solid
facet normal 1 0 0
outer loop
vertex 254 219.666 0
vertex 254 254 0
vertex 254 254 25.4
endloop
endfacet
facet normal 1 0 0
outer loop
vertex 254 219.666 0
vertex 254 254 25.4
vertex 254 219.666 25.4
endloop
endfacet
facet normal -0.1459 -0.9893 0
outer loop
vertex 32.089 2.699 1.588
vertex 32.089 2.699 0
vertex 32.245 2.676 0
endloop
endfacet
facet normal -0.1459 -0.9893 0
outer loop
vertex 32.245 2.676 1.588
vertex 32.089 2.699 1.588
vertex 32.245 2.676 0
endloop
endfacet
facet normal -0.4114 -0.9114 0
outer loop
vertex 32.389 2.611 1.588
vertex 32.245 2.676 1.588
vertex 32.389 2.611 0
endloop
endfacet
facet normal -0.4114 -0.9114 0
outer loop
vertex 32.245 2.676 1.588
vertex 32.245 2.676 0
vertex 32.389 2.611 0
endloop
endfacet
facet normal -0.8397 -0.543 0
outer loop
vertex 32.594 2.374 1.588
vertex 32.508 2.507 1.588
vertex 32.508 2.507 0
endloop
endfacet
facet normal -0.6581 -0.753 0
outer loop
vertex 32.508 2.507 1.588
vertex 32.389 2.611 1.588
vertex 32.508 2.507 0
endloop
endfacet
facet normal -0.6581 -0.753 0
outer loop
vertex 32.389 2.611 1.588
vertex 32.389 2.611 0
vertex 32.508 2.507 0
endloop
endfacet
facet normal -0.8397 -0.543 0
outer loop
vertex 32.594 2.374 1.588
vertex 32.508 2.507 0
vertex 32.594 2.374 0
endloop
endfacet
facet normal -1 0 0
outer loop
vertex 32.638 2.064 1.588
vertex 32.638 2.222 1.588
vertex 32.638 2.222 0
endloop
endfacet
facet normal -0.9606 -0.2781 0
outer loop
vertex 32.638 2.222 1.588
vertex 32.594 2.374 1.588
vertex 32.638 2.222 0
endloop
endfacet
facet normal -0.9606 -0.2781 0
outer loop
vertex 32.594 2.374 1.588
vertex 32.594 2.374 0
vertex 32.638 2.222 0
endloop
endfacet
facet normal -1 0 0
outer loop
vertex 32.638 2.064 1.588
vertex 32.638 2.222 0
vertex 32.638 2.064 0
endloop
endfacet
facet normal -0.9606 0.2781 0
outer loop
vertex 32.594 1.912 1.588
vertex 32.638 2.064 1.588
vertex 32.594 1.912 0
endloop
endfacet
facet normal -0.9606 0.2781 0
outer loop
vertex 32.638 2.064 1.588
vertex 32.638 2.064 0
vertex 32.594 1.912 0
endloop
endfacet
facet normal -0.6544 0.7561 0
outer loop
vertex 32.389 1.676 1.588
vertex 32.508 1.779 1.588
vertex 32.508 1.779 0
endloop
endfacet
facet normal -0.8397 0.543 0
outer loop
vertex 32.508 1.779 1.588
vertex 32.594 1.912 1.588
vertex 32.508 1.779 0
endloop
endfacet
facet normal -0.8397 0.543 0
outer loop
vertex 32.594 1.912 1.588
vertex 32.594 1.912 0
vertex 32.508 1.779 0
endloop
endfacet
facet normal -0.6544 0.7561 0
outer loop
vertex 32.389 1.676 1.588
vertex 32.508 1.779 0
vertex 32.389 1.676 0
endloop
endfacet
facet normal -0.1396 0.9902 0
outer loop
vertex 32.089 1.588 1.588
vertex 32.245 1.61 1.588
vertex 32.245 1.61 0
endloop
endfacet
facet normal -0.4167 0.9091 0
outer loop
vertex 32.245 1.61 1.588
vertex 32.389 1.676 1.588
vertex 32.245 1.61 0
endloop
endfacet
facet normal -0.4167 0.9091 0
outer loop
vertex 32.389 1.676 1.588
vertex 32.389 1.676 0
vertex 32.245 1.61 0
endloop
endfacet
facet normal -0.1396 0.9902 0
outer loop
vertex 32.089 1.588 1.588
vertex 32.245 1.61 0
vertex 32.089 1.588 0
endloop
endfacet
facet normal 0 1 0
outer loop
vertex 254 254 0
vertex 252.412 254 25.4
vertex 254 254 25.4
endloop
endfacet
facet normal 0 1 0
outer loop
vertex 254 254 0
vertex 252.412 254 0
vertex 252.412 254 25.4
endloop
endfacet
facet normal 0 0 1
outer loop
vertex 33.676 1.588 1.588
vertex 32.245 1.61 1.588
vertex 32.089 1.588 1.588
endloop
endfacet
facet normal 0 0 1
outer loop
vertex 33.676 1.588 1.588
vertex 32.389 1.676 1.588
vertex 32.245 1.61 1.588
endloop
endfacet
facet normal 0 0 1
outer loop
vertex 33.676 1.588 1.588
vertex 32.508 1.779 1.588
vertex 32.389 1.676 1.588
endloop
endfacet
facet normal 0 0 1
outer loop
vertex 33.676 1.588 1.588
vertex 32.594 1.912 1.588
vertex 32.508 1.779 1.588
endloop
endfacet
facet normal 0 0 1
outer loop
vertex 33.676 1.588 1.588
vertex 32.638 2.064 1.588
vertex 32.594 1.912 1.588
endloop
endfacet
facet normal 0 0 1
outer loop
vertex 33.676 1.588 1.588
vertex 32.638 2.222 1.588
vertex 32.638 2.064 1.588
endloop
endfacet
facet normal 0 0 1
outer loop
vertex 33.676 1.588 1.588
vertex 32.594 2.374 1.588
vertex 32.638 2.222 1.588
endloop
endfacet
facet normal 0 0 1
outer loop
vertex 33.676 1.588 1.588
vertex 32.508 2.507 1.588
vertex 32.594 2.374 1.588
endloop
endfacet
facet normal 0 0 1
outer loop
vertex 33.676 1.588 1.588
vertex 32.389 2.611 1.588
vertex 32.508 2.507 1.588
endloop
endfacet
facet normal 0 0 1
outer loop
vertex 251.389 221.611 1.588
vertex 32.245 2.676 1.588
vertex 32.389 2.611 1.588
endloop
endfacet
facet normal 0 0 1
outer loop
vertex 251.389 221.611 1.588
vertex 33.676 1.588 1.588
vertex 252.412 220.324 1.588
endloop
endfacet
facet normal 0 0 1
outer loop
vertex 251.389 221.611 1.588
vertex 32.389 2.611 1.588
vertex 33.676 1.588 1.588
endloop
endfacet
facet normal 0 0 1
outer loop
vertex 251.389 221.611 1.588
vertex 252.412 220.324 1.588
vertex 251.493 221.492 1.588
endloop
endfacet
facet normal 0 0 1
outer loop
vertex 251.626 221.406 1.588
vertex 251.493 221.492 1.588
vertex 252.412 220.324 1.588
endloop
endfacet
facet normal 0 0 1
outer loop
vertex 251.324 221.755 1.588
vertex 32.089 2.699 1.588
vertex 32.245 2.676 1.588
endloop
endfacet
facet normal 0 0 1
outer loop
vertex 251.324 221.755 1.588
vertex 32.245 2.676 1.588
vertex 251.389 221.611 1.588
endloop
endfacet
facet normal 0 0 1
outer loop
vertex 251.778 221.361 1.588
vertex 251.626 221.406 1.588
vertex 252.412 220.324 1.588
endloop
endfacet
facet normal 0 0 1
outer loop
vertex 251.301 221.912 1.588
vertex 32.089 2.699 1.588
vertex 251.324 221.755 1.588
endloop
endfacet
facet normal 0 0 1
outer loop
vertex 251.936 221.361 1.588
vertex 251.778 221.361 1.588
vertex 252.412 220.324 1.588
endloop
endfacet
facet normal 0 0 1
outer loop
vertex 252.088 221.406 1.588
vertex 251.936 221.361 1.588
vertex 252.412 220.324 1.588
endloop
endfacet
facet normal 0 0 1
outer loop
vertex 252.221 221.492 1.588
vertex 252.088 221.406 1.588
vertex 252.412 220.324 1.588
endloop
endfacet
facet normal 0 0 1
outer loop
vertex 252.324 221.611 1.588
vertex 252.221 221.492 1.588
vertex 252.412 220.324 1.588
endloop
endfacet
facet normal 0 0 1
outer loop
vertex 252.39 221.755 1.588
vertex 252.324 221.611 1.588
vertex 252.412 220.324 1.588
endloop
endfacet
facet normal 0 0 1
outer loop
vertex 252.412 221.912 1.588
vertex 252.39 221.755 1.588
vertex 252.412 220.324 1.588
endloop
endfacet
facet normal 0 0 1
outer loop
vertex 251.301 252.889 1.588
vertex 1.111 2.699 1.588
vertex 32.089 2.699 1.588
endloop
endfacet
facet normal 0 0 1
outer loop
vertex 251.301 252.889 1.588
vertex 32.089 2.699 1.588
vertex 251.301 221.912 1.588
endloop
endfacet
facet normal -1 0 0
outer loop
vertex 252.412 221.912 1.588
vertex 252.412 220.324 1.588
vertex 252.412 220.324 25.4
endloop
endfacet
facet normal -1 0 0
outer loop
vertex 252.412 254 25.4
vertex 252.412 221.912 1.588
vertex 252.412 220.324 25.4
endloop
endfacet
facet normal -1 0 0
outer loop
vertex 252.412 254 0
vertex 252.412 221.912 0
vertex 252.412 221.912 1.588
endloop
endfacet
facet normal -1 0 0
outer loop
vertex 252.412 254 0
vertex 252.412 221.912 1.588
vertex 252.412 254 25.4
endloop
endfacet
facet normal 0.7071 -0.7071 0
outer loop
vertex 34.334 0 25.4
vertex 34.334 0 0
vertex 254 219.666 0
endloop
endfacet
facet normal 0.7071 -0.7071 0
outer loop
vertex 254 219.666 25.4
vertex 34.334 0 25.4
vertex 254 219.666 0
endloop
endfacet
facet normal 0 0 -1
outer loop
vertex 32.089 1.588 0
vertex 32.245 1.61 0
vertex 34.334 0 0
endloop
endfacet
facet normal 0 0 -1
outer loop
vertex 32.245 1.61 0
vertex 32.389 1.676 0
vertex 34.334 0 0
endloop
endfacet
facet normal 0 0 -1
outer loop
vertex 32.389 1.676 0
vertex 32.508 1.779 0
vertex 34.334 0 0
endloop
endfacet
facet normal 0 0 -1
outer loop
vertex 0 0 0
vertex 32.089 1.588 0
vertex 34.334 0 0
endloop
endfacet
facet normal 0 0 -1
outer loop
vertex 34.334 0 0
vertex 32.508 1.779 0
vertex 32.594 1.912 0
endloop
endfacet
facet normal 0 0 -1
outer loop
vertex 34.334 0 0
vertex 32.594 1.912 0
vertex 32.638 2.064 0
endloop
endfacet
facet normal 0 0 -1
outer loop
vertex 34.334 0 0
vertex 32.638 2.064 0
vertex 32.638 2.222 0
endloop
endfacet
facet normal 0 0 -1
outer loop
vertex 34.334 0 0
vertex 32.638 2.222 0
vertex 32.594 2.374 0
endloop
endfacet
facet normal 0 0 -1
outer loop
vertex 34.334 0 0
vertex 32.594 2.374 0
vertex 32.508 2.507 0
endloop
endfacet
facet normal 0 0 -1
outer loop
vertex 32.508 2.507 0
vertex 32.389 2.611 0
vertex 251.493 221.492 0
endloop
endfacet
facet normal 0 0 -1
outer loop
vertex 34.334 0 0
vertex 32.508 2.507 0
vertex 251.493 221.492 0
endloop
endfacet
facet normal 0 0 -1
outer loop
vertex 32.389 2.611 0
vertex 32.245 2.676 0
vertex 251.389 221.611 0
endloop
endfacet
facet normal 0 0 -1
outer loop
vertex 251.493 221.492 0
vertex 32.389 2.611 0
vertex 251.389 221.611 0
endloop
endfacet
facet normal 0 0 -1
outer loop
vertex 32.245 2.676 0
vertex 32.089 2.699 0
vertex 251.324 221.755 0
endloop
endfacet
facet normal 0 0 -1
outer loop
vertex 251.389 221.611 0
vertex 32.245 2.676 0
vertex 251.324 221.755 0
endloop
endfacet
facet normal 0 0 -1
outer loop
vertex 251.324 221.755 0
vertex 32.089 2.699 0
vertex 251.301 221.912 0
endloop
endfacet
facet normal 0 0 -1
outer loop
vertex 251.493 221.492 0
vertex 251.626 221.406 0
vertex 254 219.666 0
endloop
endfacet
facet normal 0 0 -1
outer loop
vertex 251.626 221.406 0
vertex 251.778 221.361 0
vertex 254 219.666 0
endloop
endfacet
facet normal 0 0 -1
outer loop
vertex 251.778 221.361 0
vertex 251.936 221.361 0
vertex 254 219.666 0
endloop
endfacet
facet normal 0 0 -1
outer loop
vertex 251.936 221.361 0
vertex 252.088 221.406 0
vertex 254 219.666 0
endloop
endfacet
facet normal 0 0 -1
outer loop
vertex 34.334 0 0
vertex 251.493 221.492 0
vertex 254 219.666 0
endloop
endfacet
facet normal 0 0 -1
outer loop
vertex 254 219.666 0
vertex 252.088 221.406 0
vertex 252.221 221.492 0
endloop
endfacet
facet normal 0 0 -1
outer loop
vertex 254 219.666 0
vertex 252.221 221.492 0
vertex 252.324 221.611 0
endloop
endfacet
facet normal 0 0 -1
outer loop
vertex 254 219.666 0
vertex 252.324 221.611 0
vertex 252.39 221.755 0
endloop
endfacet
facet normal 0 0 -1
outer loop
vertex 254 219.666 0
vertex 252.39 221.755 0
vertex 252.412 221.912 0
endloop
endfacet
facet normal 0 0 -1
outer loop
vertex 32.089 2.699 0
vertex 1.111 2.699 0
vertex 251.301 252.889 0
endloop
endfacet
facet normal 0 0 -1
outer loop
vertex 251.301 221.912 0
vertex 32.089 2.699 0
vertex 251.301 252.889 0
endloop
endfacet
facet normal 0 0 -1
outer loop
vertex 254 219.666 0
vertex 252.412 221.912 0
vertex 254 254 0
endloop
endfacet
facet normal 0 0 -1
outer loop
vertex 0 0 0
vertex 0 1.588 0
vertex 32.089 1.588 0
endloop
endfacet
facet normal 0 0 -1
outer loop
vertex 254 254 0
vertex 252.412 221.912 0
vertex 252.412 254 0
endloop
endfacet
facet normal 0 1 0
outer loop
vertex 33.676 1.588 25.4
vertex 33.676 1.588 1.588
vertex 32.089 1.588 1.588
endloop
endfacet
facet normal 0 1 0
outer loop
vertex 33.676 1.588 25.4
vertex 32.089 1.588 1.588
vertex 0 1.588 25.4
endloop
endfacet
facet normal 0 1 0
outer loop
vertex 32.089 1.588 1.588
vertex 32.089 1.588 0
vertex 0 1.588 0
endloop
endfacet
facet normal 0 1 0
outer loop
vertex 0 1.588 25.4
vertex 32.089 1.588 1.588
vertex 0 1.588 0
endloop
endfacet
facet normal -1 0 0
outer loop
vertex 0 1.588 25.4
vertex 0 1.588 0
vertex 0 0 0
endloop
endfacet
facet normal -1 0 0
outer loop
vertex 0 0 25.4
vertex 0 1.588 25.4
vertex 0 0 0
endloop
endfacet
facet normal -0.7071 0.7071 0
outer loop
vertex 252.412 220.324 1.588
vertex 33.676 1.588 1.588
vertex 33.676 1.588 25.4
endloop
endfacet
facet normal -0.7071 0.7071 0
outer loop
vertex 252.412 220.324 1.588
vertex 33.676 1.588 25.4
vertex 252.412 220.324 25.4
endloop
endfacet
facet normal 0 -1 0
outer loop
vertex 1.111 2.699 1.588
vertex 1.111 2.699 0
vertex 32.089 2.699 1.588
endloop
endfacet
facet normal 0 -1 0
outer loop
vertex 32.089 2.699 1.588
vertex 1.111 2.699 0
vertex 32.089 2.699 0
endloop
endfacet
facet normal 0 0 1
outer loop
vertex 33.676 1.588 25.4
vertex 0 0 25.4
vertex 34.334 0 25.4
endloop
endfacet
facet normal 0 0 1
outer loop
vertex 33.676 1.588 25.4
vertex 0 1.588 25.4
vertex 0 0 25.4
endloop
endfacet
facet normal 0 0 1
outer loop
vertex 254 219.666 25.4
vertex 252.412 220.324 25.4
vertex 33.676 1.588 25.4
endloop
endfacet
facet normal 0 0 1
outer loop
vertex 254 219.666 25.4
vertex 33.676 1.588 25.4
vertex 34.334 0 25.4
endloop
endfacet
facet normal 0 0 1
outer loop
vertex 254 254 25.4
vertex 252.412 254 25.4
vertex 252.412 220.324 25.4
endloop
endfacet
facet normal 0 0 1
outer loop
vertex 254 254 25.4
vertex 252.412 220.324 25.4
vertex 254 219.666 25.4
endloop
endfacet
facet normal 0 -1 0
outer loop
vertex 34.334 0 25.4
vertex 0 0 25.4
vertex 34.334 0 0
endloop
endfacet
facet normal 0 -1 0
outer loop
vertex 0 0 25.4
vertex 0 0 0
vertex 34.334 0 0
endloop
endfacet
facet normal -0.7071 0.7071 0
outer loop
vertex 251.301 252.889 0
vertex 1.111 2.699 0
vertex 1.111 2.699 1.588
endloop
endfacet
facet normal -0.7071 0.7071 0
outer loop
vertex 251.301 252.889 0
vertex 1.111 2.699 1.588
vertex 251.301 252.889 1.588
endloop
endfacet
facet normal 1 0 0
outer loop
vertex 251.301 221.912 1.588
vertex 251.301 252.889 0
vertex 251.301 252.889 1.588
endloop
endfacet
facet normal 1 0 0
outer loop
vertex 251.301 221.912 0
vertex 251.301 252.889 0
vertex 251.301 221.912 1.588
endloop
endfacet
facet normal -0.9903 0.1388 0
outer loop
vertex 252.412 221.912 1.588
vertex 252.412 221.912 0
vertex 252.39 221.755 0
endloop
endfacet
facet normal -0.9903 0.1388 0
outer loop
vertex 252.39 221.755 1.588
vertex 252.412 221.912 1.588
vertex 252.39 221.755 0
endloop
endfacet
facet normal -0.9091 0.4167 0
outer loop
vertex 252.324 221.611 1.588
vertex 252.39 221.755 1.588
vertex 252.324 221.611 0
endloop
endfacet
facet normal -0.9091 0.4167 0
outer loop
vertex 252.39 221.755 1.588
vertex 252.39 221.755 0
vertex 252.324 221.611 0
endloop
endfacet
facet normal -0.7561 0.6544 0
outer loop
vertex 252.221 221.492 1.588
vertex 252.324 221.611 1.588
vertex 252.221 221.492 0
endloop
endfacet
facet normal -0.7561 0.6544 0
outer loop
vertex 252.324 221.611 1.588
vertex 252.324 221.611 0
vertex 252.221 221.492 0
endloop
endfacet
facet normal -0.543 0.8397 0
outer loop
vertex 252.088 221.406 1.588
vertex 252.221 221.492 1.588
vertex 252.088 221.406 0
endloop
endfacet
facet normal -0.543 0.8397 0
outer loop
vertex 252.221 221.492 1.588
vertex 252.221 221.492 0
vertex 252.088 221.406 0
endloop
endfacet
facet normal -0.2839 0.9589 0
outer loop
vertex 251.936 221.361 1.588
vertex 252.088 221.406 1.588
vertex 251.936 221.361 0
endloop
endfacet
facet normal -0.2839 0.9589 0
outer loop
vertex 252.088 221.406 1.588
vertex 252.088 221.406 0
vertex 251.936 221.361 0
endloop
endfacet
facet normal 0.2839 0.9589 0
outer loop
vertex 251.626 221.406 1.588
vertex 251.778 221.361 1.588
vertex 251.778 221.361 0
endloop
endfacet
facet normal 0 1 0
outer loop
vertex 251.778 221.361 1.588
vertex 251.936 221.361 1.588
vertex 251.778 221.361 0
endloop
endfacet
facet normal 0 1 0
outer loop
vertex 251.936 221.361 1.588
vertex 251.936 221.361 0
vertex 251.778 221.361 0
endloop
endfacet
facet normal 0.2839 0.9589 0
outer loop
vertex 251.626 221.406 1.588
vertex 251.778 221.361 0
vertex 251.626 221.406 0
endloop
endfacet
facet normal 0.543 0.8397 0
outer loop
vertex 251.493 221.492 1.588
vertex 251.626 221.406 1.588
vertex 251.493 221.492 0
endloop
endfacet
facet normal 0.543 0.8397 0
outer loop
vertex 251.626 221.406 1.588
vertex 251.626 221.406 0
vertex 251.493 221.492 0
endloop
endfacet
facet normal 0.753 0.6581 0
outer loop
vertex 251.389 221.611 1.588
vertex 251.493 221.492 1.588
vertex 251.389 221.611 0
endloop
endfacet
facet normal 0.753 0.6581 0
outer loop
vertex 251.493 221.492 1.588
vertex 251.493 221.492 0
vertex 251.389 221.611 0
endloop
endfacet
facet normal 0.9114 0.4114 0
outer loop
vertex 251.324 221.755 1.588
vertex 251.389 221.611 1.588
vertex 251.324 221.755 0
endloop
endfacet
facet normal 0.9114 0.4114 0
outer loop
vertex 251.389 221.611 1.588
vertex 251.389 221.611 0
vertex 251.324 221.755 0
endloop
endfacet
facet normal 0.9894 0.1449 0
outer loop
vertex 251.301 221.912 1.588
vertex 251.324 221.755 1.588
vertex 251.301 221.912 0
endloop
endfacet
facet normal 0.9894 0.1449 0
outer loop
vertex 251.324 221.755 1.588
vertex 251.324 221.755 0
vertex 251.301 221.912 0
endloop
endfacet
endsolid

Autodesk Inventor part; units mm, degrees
ref_plane "YZ Plane" through (0, 0, 0) normal (1, 0, 0) x (0, 1, 0)
ref_plane "XZ Plane" through (0, 0, 0) normal (0, 1, 0) x (-1, 0, 0)
ref_plane "XY Plane" through (0, 0, 0) normal (0, 0, 1) x (1, 0, 0)
sketch "Sketch1" plane through (0, 0, 0) normal (0, 0, 1) x (1, 0, 0)
  line L0 (0, 0) -> (34.3335, 0)
  line L1 (33.676, 1.5875) -> (0, 1.5875)
  line L2 (0, 1.5875) -> (0, 0)
  line L3 (34.3335, 0) -> (254, 219.6665)
  line L4 (1.1112, 2.6987) -> (251.3012, 252.8888)
  line L5 (33.676, 1.5875) -> (252.4125, 220.324)
  line L6 (1.1112, 2.6987) -> (32.0885, 2.6988)
  arc A0 (32.0885, 1.5875) -> (32.0885, 2.6988) centre (32.0885, 2.1431) ccw
  line L7 (252.4125, 220.324) -> (252.4125, 254)
  line L8 (252.4125, 254) -> (254, 254)
  line L9 (254, 254) -> (254, 219.6665)
  line L10 (251.3012, 252.8888) -> (251.3012, 221.9115)
  arc A1 (251.3012, 221.9115) -> (252.4125, 221.9115) centre (251.8569, 221.9115) ccw
  dimension "d0" = 25.4
  dimension "d1" = 135
  dimension "d2" = 1.5875
  dimension "d3" = 1.5875
  dimension "d4" = 1.1113
  dimension "d5" = 1.5875
  dimension "d6" = 1.5875
  dimension "d7" = 254
  dimension "d9" = 1.1113
  dimension "d10" = 1.5875
extrude "Extrusion1" add sketch "Sketch1" along normal blind 1.5875 contours A0 L6 L4 L10 A1 L7 L5 L1
extrude "Extrusion2" add sketch "Sketch1" along normal blind 25.4 contours L2 L1 L5 L7 L8 L9 L3 L0
equation "\"d3\" = d2"
equation "\"d4\" = 0.7 * d2"
equation "\"d5\" = d2"
equation "\"d6\" = d2"
equation "\"d9\" = d4"
equation "\"d10\" = d6"
properties part number "electronics board support outside"
